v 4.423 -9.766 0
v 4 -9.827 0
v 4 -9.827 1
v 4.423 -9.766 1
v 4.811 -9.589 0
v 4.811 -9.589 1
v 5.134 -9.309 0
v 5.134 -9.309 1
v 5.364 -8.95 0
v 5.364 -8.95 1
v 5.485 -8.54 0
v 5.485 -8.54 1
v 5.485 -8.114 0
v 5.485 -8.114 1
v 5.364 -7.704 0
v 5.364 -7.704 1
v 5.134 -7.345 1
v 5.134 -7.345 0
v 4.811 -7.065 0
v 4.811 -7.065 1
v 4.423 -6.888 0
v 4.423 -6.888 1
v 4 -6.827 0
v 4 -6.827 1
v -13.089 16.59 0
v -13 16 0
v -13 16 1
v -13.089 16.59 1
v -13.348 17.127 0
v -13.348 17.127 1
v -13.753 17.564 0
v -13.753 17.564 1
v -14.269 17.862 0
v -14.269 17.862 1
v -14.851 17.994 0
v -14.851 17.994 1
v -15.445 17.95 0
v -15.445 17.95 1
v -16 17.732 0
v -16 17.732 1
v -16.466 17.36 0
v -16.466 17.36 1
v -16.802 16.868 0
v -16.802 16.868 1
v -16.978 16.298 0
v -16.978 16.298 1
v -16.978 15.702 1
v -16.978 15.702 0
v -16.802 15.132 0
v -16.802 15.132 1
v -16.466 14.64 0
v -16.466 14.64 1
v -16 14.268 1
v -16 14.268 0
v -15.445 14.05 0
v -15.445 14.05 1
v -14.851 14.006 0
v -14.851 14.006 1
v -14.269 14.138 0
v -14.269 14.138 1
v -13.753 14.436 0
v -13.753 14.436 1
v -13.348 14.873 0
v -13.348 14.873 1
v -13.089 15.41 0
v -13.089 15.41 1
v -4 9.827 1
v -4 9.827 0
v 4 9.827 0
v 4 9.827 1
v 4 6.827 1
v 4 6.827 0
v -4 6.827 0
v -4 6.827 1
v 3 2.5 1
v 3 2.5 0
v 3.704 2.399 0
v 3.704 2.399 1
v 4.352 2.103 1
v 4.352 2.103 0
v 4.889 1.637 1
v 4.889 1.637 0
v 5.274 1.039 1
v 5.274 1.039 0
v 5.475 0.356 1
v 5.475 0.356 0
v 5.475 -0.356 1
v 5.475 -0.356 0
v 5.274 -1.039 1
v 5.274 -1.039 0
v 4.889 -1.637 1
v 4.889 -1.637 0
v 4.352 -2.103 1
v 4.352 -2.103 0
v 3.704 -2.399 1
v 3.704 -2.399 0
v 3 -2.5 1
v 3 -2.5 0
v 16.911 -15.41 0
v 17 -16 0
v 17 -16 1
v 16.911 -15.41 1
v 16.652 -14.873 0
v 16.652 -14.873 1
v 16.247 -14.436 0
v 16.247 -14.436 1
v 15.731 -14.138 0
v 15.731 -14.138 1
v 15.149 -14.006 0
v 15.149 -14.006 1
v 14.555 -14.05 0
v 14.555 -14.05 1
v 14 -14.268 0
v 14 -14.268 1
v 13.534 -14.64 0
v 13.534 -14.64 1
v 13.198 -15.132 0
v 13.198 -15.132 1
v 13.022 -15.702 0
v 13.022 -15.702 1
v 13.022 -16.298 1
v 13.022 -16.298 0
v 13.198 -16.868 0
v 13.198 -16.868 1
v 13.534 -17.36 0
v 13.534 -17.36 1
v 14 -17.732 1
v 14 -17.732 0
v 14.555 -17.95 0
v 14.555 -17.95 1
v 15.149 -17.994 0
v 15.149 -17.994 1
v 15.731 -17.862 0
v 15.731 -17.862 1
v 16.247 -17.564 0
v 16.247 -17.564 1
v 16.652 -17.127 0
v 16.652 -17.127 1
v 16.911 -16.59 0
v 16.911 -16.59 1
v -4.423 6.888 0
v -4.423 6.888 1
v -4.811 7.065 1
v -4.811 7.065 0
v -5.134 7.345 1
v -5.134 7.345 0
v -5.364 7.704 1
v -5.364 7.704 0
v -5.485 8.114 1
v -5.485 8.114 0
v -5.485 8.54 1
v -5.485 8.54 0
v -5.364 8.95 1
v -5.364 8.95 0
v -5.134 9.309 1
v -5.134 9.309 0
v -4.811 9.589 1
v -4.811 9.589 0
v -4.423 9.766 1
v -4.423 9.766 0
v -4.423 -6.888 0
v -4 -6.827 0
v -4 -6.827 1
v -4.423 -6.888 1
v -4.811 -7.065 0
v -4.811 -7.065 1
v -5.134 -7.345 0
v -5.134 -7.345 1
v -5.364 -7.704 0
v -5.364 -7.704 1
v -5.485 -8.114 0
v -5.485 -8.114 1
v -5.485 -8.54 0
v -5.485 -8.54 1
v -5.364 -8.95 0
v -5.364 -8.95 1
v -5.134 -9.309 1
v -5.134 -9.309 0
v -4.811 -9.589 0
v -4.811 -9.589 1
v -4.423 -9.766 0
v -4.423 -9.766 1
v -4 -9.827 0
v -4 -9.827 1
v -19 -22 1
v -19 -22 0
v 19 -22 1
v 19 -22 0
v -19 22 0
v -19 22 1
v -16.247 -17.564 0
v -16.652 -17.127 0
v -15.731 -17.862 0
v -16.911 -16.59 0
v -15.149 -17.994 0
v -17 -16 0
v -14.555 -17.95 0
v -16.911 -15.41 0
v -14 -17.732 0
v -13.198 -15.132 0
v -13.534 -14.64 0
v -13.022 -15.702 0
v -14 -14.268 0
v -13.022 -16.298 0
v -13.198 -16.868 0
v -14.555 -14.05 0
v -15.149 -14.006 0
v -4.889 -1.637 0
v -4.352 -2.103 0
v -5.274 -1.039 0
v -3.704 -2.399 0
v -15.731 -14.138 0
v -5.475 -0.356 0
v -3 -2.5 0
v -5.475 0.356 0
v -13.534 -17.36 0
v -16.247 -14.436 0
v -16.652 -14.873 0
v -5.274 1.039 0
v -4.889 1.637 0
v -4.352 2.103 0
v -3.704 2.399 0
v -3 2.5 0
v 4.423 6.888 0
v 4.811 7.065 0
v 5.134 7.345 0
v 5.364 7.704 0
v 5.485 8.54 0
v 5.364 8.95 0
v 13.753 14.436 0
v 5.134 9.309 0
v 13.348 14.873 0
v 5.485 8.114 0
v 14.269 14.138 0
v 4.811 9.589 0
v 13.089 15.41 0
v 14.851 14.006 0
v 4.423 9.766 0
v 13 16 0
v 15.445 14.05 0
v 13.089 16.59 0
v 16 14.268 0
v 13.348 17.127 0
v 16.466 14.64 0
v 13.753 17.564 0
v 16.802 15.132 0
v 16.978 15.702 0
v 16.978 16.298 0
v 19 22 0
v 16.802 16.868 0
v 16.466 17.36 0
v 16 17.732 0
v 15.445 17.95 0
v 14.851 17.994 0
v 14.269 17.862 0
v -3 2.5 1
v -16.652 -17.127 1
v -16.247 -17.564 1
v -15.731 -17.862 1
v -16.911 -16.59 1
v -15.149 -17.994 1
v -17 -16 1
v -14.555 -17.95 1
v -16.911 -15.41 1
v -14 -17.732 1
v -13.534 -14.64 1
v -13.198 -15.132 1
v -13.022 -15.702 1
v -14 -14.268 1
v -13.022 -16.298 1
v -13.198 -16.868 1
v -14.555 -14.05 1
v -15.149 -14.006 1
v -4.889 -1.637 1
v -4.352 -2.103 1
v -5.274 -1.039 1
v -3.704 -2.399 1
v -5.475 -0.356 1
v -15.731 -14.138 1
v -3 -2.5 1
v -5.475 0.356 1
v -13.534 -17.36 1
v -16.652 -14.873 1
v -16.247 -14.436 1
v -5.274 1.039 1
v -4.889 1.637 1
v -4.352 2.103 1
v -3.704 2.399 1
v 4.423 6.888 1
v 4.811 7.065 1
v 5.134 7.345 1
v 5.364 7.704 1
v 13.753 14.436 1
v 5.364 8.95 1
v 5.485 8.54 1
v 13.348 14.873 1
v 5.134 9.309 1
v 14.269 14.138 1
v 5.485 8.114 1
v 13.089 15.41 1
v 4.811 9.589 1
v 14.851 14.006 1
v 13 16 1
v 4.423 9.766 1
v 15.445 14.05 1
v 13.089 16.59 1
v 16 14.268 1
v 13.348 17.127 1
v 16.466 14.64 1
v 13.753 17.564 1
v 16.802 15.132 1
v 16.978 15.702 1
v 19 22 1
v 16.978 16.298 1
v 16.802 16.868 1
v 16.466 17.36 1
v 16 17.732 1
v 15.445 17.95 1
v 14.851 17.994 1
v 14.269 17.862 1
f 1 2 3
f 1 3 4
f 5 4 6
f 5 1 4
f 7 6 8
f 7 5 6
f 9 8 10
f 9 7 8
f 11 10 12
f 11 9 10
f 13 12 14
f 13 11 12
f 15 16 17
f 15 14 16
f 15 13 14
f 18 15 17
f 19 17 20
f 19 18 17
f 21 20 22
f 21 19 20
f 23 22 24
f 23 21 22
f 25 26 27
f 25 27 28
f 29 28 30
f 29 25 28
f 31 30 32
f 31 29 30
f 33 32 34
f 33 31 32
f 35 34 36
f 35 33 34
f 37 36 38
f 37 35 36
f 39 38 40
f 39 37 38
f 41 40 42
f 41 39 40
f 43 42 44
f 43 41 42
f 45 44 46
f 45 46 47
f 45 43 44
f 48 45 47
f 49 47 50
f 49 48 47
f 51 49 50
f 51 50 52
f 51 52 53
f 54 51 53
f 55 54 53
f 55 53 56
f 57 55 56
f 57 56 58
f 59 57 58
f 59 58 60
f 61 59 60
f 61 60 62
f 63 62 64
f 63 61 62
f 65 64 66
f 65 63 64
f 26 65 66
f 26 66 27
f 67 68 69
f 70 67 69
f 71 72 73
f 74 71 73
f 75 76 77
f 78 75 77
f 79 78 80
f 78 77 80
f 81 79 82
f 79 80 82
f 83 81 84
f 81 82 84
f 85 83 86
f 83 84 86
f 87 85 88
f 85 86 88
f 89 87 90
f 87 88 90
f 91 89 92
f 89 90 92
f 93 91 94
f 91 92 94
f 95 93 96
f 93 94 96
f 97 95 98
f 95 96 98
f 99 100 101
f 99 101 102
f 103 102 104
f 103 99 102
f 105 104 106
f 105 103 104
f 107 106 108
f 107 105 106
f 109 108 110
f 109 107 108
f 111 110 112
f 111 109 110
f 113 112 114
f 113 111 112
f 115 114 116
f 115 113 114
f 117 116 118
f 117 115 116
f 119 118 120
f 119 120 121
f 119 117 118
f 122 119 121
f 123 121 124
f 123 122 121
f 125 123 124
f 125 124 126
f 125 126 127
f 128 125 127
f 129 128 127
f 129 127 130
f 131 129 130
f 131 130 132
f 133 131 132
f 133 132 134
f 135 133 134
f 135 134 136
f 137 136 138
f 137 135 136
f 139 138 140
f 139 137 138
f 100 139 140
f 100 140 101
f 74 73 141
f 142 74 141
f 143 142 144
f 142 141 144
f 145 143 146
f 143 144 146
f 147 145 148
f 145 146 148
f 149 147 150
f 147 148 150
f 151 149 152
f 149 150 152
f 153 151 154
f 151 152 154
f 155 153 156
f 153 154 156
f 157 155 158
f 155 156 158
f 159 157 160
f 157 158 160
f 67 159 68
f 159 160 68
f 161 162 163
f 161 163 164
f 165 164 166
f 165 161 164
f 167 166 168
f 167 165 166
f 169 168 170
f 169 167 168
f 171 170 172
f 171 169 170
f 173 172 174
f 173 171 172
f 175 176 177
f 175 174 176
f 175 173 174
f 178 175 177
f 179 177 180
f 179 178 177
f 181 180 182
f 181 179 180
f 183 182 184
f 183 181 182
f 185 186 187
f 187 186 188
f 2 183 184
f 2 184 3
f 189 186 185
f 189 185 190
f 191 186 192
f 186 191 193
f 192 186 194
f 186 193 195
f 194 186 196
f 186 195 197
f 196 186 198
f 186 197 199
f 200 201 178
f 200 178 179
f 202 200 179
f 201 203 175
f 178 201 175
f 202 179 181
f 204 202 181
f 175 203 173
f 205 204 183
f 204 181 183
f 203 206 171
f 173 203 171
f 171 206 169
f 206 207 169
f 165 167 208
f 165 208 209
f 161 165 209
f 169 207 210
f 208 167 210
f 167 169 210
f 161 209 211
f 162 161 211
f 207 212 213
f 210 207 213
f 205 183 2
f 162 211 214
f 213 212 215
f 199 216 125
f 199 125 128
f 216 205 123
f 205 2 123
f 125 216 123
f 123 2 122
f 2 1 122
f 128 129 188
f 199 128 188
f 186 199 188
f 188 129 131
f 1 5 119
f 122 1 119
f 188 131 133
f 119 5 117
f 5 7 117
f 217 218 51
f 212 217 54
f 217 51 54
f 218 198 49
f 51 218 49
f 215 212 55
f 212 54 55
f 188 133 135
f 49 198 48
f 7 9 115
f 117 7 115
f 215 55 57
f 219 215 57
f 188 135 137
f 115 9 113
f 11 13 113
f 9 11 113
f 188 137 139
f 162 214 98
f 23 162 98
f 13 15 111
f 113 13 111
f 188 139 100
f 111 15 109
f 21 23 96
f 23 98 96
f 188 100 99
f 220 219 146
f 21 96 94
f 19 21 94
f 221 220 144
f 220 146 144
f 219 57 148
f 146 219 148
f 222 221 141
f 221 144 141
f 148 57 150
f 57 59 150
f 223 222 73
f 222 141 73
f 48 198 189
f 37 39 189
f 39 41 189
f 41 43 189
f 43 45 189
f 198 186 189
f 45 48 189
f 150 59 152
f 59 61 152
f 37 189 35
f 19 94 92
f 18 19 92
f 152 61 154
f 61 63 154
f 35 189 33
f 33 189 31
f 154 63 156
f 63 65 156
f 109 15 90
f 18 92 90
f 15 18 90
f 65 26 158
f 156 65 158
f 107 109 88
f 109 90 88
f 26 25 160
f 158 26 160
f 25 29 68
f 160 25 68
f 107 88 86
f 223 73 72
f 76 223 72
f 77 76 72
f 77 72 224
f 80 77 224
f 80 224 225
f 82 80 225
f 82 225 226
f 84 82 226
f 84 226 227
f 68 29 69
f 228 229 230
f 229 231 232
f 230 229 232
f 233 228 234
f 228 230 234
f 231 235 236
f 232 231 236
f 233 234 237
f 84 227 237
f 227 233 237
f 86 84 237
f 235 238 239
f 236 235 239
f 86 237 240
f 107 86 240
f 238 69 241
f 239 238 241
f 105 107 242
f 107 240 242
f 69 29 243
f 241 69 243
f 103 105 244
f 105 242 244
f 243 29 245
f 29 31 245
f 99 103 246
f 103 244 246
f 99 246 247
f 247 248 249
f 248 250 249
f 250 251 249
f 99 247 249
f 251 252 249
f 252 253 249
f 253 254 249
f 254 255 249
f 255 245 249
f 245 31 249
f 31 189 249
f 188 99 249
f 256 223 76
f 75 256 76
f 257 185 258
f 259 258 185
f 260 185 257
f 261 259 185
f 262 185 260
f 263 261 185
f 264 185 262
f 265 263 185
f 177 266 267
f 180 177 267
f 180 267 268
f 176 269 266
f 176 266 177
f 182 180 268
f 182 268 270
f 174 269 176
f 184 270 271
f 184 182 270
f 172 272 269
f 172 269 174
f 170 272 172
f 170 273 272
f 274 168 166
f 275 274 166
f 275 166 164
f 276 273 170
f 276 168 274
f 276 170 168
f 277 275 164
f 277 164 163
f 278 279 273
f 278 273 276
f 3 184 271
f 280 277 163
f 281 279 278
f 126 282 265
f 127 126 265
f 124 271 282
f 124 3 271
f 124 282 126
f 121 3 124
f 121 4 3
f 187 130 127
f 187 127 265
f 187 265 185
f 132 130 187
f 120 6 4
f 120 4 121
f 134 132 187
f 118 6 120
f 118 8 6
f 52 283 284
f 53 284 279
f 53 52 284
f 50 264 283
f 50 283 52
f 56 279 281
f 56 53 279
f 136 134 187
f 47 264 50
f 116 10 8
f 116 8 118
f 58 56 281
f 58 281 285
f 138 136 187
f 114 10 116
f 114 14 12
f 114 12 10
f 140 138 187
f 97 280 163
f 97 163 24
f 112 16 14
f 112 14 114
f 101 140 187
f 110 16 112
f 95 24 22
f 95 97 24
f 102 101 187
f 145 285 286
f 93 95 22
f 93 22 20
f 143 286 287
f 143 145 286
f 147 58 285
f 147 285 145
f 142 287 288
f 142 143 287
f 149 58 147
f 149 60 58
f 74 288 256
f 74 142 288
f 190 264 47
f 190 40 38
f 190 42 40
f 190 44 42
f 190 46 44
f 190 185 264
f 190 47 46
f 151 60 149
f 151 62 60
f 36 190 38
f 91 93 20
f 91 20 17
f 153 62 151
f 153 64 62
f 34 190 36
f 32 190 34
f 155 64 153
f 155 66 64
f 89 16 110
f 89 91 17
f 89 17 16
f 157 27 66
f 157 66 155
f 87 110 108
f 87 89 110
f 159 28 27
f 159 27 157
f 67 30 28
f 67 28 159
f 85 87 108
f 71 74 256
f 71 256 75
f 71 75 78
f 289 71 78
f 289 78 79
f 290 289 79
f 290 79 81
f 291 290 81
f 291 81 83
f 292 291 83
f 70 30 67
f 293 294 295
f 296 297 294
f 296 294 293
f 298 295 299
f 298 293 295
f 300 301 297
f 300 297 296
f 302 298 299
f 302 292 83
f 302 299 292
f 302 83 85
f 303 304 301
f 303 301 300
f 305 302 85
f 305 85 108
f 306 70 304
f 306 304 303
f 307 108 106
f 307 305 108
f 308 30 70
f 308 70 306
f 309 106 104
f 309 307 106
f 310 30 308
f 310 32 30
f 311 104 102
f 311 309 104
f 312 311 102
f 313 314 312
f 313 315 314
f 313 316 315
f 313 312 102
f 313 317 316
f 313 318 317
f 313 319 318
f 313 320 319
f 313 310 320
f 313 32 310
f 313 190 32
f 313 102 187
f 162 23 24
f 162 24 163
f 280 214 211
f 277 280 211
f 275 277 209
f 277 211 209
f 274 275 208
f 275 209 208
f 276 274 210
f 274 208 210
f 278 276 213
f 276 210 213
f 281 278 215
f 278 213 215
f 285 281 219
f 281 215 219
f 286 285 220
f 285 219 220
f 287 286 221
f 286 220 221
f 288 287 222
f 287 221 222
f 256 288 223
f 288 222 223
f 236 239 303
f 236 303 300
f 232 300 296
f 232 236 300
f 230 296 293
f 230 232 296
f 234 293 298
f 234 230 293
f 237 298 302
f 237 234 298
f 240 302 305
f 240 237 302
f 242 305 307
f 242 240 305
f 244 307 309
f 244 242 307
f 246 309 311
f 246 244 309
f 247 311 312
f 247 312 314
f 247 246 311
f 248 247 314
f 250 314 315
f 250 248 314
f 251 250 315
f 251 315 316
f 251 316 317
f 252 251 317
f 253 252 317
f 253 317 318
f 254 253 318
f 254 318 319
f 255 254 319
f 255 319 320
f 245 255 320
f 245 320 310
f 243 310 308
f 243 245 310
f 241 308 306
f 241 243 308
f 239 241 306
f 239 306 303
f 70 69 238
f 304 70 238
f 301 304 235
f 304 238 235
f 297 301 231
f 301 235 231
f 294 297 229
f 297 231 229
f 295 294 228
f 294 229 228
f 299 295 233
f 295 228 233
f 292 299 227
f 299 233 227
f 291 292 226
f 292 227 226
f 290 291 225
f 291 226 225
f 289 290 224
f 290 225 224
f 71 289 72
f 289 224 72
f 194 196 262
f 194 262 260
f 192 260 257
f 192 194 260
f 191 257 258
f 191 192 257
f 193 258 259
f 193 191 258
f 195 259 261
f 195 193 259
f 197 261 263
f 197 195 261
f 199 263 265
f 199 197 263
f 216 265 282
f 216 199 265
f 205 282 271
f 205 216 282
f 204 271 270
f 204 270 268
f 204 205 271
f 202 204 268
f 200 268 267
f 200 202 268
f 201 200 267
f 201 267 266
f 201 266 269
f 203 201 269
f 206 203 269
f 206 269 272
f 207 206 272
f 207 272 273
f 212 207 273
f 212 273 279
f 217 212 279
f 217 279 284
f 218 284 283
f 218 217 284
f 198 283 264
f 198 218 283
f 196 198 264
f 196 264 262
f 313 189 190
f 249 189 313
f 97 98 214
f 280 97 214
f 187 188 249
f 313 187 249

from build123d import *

# Parameters (mm, degrees)
SKETCH1_W               = 38
SKETCH1_H               = 44
SKETCH1_R               = 2
BOSS_EXTRUDE1_DEPTH     = 1
CUT_EXTRUDE1_DEPTH      = 30.086079144
CUT_EXTRUDE1_DEPTH_BACK = 30.086079144


with BuildPart() as part:
    # Sketch1 → Boss-Extrude1 (new body)
    with BuildSketch(Plane.XY):
        Rectangle(SKETCH1_W, SKETCH1_H)
        with Locations((-15, 16)):
            Circle(SKETCH1_R, mode=Mode.SUBTRACT)
        with Locations(Location((-15, -16, 0), (0, 0, 180))):
            Circle(SKETCH1_R, mode=Mode.SUBTRACT)
        with Locations((15, -16)):
            Circle(SKETCH1_R, mode=Mode.SUBTRACT)
        with Locations(Location((15, 16, 0), (0, 0, 180))):
            Circle(SKETCH1_R, mode=Mode.SUBTRACT)
    extrude(amount=BOSS_EXTRUDE1_DEPTH)

    # Sketch2 → Cut-Extrude1 (cut, two sides: drawn at the far end of the back side and taken through both)
    with BuildSketch(Plane.XY.offset(-CUT_EXTRUDE1_DEPTH_BACK)):
        with BuildLine():
            Line((-3, 2.5), (3, 2.5))
            ThreePointArc((3, 2.5), (5.5, 0), (3, -2.5))
            Line((3, -2.5), (-3, -2.5))
            ThreePointArc((-3, -2.5), (-5.5, 0), (-3, 2.5))
        make_face()
        with BuildLine():
            Line((-4, 9.827019403), (4, 9.827019403))
            ThreePointArc((4, 9.827019403), (5.5, 8.327019403), (4, 6.827019403))
            Line((4, 6.827019403), (-4, 6.827019403))
            ThreePointArc((-4, 6.827019403), (-5.5, 8.327019403), (-4, 9.827019403))
        make_face()
        with BuildLine():
            Line((-4, -9.827019403), (4, -9.827019403))
            ThreePointArc((4, -9.827019403), (5.5, -8.327019403), (4, -6.827019403))
            Line((4, -6.827019403), (-4, -6.827019403))
            ThreePointArc((-4, -6.827019403), (-5.5, -8.327019403), (-4, -9.827019403))
        make_face()
    extrude(amount=CUT_EXTRUDE1_DEPTH + CUT_EXTRUDE1_DEPTH_BACK, mode=Mode.SUBTRACT)


solid = part.part
